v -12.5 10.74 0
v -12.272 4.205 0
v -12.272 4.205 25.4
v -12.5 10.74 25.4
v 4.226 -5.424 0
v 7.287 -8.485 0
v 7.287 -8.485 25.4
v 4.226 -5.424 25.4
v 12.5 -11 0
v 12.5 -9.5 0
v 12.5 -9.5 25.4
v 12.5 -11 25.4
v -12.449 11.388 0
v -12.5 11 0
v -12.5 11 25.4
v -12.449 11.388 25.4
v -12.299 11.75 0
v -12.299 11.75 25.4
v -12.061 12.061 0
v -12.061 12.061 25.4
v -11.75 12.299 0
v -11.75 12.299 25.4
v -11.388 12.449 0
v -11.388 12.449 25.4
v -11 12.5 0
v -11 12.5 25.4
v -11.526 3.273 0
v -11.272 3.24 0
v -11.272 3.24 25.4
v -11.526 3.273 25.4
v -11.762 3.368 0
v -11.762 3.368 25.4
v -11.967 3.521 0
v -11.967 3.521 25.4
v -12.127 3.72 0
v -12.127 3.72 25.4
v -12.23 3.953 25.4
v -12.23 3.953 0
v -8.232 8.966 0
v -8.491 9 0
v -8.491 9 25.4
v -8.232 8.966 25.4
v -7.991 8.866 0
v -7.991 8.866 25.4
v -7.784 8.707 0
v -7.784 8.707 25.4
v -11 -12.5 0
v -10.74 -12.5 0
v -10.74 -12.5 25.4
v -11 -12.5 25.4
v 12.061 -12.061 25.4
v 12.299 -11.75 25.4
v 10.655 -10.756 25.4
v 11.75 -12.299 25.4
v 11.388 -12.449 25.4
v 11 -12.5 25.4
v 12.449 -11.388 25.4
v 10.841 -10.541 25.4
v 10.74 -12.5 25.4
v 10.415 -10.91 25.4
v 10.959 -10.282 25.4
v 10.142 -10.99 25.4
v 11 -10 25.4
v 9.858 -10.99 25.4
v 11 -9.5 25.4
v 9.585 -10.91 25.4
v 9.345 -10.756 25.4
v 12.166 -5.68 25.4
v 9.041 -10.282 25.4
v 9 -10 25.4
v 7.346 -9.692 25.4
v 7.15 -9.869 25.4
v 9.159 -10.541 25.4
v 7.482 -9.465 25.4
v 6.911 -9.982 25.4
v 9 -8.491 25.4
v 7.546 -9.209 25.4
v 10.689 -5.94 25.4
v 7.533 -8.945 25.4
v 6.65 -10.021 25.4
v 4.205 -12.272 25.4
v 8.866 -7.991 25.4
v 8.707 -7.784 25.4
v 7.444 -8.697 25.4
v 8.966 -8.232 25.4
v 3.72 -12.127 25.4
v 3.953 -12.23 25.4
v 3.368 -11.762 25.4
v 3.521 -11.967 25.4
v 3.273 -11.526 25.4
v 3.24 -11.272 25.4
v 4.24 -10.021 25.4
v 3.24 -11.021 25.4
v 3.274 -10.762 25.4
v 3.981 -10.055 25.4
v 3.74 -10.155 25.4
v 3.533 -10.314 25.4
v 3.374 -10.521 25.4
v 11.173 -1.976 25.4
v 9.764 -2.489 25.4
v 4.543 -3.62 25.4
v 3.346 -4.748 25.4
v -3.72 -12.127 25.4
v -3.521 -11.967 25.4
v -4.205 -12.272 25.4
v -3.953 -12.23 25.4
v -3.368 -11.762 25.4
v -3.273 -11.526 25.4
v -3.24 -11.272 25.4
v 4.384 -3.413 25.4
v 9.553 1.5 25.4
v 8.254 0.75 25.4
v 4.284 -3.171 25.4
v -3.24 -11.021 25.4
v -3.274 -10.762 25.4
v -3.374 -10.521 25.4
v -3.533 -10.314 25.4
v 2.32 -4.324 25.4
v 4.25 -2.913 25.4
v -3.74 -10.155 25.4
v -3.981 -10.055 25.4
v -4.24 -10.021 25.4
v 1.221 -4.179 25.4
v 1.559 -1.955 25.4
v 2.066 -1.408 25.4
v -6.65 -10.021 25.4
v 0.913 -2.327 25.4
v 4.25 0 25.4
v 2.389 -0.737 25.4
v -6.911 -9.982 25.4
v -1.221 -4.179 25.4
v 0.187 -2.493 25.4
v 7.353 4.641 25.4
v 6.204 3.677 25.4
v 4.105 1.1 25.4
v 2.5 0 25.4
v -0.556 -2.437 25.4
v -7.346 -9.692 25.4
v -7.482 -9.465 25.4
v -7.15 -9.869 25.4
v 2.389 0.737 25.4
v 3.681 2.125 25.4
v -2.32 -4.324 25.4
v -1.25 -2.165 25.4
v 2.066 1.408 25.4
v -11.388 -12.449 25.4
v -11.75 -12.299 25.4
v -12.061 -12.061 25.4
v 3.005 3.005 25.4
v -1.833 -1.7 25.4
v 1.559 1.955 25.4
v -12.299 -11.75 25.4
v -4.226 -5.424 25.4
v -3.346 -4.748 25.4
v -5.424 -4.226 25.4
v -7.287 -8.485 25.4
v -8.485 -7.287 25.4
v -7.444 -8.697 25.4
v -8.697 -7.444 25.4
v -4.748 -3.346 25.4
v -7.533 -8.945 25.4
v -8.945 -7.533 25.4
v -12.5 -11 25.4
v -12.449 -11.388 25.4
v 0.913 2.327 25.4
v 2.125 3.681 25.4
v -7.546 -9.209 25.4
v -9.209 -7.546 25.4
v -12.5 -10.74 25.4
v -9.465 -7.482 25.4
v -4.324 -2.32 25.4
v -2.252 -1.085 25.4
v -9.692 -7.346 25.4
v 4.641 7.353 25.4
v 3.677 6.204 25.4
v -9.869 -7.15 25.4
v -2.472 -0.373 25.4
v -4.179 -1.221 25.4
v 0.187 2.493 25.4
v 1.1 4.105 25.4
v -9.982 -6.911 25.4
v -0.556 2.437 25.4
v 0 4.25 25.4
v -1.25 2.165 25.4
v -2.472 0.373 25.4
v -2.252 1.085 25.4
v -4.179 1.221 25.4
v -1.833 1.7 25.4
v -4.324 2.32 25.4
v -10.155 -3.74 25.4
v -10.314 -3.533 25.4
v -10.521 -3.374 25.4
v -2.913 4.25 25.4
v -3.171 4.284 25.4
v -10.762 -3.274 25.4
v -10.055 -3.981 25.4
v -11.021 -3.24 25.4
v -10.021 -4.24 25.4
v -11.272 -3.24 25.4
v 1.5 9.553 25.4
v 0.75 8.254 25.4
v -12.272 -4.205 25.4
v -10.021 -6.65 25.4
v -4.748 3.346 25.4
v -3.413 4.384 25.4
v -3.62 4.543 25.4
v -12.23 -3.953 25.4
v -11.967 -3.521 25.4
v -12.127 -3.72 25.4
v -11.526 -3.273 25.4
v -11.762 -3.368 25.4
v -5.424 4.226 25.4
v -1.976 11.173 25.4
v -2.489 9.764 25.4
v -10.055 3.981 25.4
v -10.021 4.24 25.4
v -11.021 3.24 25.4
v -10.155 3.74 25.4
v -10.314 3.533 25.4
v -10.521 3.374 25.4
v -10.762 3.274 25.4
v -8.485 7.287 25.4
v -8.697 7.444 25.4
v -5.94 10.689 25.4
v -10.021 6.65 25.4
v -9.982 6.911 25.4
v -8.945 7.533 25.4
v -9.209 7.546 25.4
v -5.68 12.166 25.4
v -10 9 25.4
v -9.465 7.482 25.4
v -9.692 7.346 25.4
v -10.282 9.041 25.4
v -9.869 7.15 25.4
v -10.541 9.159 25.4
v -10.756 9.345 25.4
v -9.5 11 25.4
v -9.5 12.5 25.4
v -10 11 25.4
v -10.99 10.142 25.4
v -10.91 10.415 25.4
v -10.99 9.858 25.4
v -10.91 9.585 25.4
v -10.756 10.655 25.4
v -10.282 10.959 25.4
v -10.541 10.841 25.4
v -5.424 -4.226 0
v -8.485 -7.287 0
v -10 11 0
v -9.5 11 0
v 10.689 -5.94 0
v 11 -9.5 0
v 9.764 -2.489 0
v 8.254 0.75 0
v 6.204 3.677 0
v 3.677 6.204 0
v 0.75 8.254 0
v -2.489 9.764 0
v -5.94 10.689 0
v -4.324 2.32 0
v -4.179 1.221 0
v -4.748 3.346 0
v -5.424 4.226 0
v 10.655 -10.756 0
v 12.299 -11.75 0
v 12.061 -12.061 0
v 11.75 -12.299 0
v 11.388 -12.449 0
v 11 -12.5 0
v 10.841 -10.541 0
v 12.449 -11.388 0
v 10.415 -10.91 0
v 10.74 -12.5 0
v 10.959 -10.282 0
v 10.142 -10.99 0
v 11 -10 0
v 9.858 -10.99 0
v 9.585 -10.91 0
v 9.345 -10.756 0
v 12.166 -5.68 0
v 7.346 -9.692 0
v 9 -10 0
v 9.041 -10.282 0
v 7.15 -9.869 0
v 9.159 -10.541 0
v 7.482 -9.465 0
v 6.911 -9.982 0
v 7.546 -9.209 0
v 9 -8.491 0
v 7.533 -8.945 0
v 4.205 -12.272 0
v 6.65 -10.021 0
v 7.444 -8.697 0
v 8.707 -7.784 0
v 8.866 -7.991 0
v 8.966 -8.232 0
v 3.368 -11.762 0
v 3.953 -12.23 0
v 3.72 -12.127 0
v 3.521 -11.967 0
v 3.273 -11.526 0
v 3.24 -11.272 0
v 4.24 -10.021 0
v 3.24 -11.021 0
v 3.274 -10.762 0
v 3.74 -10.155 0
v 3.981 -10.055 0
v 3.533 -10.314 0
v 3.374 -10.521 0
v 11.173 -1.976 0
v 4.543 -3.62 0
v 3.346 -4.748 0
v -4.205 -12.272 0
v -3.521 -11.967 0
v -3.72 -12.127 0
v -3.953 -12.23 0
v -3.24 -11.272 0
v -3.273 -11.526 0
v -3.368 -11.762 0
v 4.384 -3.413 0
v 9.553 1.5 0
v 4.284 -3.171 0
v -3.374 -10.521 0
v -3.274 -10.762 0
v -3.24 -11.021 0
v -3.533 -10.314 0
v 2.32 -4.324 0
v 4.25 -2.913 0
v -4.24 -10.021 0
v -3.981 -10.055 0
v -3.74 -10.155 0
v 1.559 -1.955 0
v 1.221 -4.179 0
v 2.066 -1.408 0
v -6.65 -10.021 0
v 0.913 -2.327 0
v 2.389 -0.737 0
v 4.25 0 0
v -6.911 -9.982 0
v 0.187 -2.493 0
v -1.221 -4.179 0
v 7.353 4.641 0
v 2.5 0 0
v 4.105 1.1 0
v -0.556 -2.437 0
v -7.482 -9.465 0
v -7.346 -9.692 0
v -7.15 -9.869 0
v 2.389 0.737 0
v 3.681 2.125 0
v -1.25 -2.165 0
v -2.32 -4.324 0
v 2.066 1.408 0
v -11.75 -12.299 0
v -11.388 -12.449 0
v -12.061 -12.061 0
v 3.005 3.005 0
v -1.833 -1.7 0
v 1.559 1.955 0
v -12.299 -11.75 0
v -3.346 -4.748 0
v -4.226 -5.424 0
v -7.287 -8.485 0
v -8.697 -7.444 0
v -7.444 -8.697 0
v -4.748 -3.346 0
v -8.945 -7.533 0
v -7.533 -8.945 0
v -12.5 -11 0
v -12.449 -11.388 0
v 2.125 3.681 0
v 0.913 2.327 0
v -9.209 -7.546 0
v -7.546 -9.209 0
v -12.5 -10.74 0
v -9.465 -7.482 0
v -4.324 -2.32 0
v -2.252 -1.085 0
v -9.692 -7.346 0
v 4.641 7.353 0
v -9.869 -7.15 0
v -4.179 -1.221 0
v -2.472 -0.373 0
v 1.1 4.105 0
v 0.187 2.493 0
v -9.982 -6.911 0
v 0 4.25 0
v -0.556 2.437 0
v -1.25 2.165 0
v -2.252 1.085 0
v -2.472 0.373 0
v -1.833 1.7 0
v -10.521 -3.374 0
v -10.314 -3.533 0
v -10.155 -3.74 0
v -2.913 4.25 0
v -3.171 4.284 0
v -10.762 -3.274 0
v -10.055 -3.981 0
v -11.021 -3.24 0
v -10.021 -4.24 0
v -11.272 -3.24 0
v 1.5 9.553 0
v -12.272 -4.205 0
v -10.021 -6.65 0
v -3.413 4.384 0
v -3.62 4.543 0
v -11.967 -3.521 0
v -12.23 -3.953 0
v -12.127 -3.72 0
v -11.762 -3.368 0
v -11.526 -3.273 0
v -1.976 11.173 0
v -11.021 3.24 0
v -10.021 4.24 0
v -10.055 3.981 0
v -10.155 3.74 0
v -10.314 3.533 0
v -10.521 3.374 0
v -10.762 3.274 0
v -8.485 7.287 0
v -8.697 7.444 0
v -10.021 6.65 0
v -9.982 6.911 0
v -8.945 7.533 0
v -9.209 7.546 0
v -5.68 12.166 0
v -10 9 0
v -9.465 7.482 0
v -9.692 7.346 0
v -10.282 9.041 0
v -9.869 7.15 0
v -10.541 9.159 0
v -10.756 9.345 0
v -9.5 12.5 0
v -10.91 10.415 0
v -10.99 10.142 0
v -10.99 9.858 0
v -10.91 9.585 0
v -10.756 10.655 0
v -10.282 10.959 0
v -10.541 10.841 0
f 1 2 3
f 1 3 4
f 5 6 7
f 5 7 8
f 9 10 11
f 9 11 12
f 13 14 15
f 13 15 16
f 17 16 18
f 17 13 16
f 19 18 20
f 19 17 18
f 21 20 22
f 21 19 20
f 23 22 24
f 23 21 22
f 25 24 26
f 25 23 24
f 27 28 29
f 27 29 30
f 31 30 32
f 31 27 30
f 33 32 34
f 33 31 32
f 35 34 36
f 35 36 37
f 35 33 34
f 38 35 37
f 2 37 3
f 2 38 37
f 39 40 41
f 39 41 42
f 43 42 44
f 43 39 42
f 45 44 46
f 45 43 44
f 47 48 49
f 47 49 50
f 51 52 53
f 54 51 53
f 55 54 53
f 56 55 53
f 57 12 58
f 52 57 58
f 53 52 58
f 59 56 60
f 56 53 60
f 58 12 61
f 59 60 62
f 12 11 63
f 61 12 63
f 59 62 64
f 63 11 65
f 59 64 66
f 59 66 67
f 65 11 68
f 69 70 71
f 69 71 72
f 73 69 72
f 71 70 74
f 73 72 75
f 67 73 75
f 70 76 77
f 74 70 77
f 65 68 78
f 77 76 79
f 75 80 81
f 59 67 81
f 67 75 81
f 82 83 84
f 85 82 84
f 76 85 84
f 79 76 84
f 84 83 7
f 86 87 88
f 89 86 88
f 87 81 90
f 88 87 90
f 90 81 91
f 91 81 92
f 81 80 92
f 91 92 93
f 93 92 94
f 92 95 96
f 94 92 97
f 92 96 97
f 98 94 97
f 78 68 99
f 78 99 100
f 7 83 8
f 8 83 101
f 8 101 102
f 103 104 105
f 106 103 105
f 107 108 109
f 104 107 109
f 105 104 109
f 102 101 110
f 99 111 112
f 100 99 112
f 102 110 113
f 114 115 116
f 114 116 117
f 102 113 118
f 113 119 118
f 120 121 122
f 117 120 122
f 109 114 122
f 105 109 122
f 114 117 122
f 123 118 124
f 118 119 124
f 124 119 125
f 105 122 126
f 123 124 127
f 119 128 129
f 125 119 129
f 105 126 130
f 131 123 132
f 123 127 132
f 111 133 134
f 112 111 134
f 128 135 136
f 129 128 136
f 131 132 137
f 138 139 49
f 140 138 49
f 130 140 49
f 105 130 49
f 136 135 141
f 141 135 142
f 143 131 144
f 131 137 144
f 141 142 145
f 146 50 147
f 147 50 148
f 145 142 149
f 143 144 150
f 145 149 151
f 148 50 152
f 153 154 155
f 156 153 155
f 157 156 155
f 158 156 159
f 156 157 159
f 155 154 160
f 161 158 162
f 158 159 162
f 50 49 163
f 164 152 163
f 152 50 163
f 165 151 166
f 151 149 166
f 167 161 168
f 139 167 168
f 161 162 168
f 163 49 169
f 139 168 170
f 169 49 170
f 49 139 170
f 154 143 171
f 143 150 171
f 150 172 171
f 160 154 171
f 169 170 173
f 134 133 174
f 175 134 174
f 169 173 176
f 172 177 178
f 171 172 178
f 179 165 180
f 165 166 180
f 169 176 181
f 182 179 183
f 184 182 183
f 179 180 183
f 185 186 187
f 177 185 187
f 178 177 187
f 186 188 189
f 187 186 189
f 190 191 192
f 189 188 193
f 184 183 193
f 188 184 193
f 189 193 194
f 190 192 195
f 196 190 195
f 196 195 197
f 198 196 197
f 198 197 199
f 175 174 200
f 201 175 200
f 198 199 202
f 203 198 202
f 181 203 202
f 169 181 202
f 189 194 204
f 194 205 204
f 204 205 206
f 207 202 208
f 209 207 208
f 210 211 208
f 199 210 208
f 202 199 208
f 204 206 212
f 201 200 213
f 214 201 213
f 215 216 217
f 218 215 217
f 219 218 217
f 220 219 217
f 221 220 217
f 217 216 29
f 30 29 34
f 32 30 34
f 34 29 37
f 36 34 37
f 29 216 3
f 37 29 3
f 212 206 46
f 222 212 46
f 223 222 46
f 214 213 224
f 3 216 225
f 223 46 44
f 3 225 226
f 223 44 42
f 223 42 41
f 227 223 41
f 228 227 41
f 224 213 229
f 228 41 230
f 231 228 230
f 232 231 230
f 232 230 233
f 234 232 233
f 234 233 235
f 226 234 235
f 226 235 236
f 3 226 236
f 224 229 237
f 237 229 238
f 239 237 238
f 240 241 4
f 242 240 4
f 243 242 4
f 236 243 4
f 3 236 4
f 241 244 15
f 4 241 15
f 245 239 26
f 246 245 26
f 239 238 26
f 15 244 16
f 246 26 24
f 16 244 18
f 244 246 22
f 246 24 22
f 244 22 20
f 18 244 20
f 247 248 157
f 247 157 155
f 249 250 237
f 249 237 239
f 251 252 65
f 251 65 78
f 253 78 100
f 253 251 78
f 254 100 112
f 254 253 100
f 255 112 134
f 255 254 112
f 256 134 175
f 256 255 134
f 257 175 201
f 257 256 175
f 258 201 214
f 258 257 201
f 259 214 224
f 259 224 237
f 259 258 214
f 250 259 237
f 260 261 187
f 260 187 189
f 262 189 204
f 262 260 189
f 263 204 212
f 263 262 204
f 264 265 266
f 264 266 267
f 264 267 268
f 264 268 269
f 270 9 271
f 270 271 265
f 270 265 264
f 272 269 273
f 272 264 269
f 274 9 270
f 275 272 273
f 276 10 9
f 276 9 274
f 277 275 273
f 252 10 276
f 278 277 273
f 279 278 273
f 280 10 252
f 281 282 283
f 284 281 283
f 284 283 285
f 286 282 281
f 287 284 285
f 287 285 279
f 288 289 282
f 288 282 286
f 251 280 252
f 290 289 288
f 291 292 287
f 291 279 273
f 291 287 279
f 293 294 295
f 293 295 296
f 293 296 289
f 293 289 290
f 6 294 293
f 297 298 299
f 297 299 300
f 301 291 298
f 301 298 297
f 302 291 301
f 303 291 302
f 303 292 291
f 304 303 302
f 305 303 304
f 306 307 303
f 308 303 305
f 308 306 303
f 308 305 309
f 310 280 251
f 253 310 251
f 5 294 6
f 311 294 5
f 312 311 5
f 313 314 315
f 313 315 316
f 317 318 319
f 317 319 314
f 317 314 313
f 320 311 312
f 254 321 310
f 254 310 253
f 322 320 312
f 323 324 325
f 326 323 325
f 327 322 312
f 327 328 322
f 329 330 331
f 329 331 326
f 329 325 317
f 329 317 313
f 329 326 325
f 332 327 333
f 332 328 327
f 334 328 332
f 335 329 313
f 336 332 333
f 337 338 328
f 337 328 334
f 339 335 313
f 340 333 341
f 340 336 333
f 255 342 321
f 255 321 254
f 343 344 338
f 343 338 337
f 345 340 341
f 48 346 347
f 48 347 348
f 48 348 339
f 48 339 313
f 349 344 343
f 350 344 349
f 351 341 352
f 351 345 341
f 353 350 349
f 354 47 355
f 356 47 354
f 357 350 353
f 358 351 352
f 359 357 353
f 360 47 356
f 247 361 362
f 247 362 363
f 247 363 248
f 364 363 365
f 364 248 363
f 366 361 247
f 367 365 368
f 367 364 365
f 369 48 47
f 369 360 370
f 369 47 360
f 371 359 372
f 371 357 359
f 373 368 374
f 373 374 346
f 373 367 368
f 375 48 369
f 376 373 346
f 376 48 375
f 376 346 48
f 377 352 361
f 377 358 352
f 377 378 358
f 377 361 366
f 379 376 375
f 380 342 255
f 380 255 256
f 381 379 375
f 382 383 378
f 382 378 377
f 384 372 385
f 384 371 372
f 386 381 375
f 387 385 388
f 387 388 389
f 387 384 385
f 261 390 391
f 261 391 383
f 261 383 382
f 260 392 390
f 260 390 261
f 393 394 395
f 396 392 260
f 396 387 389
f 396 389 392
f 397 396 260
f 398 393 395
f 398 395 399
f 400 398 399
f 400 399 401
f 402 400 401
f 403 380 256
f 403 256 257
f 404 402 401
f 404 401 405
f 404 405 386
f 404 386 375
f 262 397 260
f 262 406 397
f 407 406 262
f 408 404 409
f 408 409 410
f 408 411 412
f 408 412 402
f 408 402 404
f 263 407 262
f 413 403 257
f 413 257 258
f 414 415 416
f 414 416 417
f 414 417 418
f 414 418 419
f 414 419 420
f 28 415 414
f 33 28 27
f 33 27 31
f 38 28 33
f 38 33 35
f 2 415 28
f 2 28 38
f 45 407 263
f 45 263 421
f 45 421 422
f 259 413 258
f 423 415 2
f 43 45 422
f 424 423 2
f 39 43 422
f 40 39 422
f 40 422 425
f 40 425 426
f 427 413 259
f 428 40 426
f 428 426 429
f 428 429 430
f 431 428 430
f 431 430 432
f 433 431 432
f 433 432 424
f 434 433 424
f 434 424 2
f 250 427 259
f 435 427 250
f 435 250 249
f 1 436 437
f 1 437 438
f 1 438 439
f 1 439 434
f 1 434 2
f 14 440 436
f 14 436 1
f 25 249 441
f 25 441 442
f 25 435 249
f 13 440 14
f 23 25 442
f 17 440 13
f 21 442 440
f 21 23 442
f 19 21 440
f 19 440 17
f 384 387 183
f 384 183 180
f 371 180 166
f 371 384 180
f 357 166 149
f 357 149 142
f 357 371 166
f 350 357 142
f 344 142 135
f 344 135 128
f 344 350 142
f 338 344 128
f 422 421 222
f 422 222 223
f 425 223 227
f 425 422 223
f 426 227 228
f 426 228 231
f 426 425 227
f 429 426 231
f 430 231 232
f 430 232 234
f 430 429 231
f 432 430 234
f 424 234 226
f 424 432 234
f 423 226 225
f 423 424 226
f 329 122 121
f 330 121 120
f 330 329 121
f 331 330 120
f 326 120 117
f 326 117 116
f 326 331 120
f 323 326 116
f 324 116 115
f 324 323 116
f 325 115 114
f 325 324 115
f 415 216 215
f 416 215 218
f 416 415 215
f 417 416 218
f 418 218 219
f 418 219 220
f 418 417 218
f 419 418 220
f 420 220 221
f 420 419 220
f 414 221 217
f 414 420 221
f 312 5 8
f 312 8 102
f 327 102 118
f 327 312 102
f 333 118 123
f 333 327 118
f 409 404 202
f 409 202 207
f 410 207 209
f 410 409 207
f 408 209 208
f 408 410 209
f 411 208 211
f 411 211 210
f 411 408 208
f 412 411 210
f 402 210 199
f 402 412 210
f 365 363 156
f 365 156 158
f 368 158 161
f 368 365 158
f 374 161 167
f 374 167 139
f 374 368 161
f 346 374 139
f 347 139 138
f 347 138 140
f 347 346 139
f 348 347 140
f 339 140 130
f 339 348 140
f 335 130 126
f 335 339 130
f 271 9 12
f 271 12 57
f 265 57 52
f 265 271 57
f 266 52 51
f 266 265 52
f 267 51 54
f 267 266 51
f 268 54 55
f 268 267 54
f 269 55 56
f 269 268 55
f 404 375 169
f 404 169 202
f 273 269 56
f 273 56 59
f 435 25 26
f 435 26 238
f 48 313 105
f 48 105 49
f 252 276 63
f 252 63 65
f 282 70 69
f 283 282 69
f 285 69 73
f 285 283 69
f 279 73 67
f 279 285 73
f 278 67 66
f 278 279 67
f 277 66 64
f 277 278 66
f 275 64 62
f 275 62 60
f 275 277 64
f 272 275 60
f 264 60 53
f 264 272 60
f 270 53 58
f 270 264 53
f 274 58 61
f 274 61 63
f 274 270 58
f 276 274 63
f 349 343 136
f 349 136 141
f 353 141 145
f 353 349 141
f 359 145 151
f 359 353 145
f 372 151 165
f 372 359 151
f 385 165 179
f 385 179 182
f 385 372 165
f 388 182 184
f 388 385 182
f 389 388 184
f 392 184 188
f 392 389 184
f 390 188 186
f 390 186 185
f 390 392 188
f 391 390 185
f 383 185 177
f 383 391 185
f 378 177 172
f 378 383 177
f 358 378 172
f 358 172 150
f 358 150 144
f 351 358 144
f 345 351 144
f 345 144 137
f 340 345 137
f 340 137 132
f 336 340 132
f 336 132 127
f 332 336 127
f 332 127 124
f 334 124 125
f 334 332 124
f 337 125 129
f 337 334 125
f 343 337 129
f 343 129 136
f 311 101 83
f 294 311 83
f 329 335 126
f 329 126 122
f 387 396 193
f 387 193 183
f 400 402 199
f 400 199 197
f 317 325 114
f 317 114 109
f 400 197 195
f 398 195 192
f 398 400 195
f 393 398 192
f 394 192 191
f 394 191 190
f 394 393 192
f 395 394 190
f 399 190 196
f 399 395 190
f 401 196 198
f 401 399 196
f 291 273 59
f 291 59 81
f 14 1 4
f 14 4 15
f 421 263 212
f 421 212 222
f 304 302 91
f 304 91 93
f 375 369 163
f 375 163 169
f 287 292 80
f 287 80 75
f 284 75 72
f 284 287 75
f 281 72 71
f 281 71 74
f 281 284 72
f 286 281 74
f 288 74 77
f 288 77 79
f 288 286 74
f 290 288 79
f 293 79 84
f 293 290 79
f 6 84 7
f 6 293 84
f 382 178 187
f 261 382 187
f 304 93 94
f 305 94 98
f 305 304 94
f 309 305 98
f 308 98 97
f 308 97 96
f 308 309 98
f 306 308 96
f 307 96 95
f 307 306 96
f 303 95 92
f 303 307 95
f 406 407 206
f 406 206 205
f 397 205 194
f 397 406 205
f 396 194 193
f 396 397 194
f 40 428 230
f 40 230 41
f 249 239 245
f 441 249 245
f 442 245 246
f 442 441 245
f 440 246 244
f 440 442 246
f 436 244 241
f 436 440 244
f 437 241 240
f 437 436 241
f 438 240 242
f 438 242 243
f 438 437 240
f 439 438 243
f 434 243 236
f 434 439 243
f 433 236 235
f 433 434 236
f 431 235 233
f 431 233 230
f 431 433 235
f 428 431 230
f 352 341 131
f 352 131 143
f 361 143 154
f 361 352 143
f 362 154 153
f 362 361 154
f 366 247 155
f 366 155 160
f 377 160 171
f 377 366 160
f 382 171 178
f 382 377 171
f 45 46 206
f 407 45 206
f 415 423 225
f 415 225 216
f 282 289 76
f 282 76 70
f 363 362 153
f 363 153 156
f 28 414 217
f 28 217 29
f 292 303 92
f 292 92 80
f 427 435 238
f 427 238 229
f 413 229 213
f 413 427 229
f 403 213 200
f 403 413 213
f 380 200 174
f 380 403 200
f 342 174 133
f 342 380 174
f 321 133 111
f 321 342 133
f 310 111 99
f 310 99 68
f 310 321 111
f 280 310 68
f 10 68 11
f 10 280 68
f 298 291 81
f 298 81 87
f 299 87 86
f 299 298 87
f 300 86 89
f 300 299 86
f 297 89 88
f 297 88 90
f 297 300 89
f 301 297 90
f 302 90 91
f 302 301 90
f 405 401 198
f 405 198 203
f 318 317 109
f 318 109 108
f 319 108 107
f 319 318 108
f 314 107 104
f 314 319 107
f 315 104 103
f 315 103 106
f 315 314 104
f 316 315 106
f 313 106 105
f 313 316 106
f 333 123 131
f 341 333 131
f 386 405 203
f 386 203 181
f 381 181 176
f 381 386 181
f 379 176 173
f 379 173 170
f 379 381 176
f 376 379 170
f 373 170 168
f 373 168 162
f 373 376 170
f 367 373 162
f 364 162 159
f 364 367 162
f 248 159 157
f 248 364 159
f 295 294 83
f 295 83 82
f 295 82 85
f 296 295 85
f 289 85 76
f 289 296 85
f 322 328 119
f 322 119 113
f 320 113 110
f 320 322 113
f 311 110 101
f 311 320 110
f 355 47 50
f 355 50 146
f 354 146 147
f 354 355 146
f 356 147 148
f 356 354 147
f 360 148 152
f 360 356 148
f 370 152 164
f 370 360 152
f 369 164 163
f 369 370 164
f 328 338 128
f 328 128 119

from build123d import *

# Parameters (mm, degrees)
SKETCH1_R      = 2.5
EXTRUDE1_DEPTH = 25.4


with BuildPart() as part:
    # Sketch1 → Extrude1 (new body)
    with BuildSketch(Plane.XY):
        with BuildLine():
            Line((1.22051236, -4.17896), (-1.22051236, -4.17896))
            ThreePointArc((-1.22051236, -4.17896), (-2.846916947, -4.502471987), (-4.22571618, -5.42375618))
            Line((-4.22571618, -5.42375618), (-7.286523897, -8.484563897))
            ThreePointArc((-7.286523897, -8.484563897), (-7.481619373, -9.465375089), (-6.650127794, -10.02096))
            Line((-6.650127794, -10.02096), (-4.24, -10.02096))
            ThreePointArc((-4.24, -10.02096), (-3.532893219, -10.313853219), (-3.24, -11.02096))
            Line((-3.24, -11.02096), (-3.24, -11.272405454))
            ThreePointArc((-3.24, -11.272405454), (-3.5206602, -11.967063824), (-4.205100503, -12.271796281))
            Line((-4.205100503, -12.271796281), (-10.74, -12.5))
            Line((-10.74, -12.5), (-11, -12.5))
            ThreePointArc((-11, -12.5), (-12.060660172, -12.060660172), (-12.5, -11))
            Line((-12.5, -11), (-12.5, -10.74))
            Line((-12.5, -10.74), (-12.271796281, -4.205100503))
            ThreePointArc((-12.271796281, -4.205100503), (-11.967063824, -3.5206602), (-11.272405454, -3.24))
            Line((-11.272405454, -3.24), (-11.02096, -3.24))
            ThreePointArc((-11.02096, -3.24), (-10.313853219, -3.532893219), (-10.02096, -4.24))
            Line((-10.02096, -4.24), (-10.02096, -6.650127794))
            ThreePointArc((-10.02096, -6.650127794), (-9.465375089, -7.481619373), (-8.484563897, -7.286523897))
            Line((-8.484563897, -7.286523897), (-5.42375618, -4.22571618))
            ThreePointArc((-5.42375618, -4.22571618), (-4.502471987, -2.846916947), (-4.17896, -1.22051236))
            Line((-4.17896, -1.22051236), (-4.17896, 1.22051236))
            ThreePointArc((-4.17896, 1.22051236), (-4.502471987, 2.846916947), (-5.42375618, 4.22571618))
            Line((-5.42375618, 4.22571618), (-8.484563897, 7.286523897))
            ThreePointArc((-8.484563897, 7.286523897), (-9.465375089, 7.481619373), (-10.02096, 6.650127794))
            Line((-10.02096, 6.650127794), (-10.02096, 4.24))
            ThreePointArc((-10.02096, 4.24), (-10.313853219, 3.532893219), (-11.02096, 3.24))
            Line((-11.02096, 3.24), (-11.272405454, 3.24))
            ThreePointArc((-11.272405454, 3.24), (-11.967063824, 3.5206602), (-12.271796281, 4.205100503))
            Line((-12.271796281, 4.205100503), (-12.5, 10.74))
            Line((-12.5, 10.74), (-12.5, 11))
            ThreePointArc((-12.5, 11), (-12.060660172, 12.060660172), (-11, 12.5))
            Line((-11, 12.5), (-9.5, 12.5))
            ThreePointArc((-9.5, 12.5), (6.056349186, 6.056349186), (12.5, -9.5))
            Line((12.5, -9.5), (12.5, -11))
            ThreePointArc((12.5, -11), (12.060660172, -12.060660172), (11, -12.5))
            Line((11, -12.5), (10.74, -12.5))
            Line((10.74, -12.5), (4.205100503, -12.271796281))
            ThreePointArc((4.205100503, -12.271796281), (3.5206602, -11.967063824), (3.24, -11.272405454))
            Line((3.24, -11.272405454), (3.24, -11.02096))
            ThreePointArc((3.24, -11.02096), (3.532893219, -10.313853219), (4.24, -10.02096))
            Line((4.24, -10.02096), (6.650127794, -10.02096))
            ThreePointArc((6.650127794, -10.02096), (7.481619373, -9.465375089), (7.286523897, -8.484563897))
            Line((7.286523897, -8.484563897), (4.22571618, -5.42375618))
            ThreePointArc((4.22571618, -5.42375618), (2.846916947, -4.502471987), (1.22051236, -4.17896))
        make_face()
        Circle(SKETCH1_R, mode=Mode.SUBTRACT)
        with BuildLine():
            Line((4.25, 0), (4.25, -2.912506094))
            ThreePointArc((4.25, -2.912506094), (4.326120467, -3.295189526), (4.542893219, -3.619612875))
            Line((4.542893219, -3.619612875), (8.707106781, -7.783826438))
            ThreePointArc((8.707106781, -7.783826438), (8.923879533, -8.108249786), (9, -8.490933219))
            Line((9, -8.490933219), (9, -10))
            ThreePointArc((9, -10), (10, -11), (11, -10))
            Line((11, -10), (11, -9.5))
            ThreePointArc((11, -9.5), (4.995689014, 4.995689014), (-9.5, 11))
            Line((-9.5, 11), (-10, 11))
            ThreePointArc((-10, 11), (-11, 10), (-10, 9))
            Line((-10, 9), (-8.490933219, 9))
            ThreePointArc((-8.490933219, 9), (-8.108249786, 8.923879533), (-7.783826438, 8.707106781))
            Line((-7.783826438, 8.707106781), (-3.619612875, 4.542893219))
            ThreePointArc((-3.619612875, 4.542893219), (-3.295189526, 4.326120467), (-2.912506094, 4.25))
            Line((-2.912506094, 4.25), (0, 4.25))
            ThreePointArc((0, 4.25), (3.00520382, 3.00520382), (4.25, 0))
        make_face(mode=Mode.SUBTRACT)
    extrude(amount=EXTRUDE1_DEPTH)


solid = part.part
